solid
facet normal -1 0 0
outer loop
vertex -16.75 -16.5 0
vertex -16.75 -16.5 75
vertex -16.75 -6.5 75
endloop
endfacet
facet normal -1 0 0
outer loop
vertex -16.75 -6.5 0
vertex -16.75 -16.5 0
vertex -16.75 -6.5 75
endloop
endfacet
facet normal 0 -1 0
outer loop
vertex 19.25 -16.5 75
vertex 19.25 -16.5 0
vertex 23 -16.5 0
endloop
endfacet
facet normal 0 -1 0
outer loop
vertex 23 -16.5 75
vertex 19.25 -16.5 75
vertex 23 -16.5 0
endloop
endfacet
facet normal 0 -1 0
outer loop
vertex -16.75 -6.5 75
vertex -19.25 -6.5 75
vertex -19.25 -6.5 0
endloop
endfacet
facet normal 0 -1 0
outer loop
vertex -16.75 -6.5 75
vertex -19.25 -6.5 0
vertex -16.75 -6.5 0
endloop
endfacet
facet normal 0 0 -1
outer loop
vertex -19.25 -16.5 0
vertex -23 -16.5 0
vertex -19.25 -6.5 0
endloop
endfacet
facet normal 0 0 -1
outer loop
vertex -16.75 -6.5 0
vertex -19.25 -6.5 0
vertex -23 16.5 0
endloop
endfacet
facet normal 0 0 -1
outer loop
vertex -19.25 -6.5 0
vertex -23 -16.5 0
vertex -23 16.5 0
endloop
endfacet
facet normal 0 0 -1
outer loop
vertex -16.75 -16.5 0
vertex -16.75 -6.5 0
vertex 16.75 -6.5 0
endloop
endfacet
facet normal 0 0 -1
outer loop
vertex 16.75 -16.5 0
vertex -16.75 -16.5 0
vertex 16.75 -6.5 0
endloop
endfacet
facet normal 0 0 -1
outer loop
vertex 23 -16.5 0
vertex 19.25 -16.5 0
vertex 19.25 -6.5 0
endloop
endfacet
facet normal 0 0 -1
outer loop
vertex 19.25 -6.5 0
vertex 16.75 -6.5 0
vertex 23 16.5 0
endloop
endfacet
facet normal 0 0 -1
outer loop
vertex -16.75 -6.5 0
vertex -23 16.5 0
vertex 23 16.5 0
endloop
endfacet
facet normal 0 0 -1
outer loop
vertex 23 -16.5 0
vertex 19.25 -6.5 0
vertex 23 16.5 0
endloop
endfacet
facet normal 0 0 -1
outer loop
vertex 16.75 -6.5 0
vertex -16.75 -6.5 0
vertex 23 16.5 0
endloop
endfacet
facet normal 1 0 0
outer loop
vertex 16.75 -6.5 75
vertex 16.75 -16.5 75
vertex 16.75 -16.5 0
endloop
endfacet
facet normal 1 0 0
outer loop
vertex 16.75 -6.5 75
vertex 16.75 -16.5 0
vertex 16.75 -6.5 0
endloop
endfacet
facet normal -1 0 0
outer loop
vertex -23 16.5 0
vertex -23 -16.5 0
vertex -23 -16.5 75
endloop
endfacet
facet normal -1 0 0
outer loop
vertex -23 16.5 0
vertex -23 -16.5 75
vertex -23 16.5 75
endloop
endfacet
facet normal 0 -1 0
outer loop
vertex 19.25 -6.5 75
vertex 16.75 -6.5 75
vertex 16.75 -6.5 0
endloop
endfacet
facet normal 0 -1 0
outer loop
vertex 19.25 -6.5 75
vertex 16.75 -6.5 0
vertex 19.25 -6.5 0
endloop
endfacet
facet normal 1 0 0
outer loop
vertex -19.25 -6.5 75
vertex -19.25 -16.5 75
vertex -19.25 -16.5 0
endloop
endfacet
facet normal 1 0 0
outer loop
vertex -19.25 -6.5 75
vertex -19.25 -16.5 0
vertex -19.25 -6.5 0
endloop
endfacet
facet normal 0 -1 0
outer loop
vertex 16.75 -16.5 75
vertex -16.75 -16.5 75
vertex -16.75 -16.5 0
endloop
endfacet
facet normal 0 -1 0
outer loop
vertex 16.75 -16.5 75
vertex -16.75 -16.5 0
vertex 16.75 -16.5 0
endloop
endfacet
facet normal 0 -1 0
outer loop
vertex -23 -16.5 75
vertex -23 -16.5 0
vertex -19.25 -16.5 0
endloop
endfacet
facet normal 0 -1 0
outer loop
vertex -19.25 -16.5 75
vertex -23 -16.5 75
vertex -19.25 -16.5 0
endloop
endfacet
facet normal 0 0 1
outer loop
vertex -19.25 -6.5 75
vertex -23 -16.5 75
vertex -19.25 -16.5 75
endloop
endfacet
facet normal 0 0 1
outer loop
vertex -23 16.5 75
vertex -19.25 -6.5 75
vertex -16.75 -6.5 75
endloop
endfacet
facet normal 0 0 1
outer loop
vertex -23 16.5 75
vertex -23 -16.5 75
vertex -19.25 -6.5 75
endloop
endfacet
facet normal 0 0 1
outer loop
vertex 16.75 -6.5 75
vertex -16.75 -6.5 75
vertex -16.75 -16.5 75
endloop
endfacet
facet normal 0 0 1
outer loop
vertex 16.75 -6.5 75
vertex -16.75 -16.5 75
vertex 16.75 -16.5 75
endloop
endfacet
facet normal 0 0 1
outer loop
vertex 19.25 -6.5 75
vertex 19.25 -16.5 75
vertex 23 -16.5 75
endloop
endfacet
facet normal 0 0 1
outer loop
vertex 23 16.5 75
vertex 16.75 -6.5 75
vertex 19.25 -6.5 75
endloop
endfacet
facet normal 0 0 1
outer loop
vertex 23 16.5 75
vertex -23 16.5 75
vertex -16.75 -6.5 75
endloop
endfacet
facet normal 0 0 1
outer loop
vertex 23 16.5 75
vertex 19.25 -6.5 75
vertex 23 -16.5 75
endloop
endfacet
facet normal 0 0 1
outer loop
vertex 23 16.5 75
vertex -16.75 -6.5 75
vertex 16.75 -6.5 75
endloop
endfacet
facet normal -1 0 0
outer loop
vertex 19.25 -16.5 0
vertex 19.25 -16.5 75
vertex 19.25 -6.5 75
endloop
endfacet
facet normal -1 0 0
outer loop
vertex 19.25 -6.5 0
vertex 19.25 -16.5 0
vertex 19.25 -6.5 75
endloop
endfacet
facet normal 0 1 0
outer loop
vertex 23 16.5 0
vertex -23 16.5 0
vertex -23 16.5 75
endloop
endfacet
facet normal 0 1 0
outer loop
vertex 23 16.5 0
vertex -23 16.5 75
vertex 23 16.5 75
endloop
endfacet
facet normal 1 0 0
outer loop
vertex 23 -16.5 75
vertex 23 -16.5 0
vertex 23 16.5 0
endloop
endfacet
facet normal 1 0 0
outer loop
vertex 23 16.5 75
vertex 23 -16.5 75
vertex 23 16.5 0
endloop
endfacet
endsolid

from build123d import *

# Parameters (mm, degrees)
SKIZZE1_W                       = 46
SKIZZE1_H                       = 33
AUFSATZ_LINEAR_AUSTRAGEN1_DEPTH = 75
SKIZZE2_W                       = 2.5
SKIZZE2_H                       = 10
SCHNITT_LINEAR_AUSTRAGEN1_DEPTH = 81.163894616


with BuildPart() as part:
    # Skizze1 → Aufsatz-Linear austragen1 (new body)
    with BuildSketch(Plane.XY):
        Rectangle(SKIZZE1_W, SKIZZE1_H)
    extrude(amount=AUFSATZ_LINEAR_AUSTRAGEN1_DEPTH)

    # Skizze2 → Schnitt-Linear austragen1 (cut, through all)
    with BuildSketch(Plane.XY.offset(75)):
        with Locations((-18, -11.5)):
            Rectangle(SKIZZE2_W, SKIZZE2_H)
        with Locations((18, -11.5)):
            Rectangle(SKIZZE2_W, SKIZZE2_H)
    extrude(amount=-SCHNITT_LINEAR_AUSTRAGEN1_DEPTH, mode=Mode.SUBTRACT)


solid = part.part
